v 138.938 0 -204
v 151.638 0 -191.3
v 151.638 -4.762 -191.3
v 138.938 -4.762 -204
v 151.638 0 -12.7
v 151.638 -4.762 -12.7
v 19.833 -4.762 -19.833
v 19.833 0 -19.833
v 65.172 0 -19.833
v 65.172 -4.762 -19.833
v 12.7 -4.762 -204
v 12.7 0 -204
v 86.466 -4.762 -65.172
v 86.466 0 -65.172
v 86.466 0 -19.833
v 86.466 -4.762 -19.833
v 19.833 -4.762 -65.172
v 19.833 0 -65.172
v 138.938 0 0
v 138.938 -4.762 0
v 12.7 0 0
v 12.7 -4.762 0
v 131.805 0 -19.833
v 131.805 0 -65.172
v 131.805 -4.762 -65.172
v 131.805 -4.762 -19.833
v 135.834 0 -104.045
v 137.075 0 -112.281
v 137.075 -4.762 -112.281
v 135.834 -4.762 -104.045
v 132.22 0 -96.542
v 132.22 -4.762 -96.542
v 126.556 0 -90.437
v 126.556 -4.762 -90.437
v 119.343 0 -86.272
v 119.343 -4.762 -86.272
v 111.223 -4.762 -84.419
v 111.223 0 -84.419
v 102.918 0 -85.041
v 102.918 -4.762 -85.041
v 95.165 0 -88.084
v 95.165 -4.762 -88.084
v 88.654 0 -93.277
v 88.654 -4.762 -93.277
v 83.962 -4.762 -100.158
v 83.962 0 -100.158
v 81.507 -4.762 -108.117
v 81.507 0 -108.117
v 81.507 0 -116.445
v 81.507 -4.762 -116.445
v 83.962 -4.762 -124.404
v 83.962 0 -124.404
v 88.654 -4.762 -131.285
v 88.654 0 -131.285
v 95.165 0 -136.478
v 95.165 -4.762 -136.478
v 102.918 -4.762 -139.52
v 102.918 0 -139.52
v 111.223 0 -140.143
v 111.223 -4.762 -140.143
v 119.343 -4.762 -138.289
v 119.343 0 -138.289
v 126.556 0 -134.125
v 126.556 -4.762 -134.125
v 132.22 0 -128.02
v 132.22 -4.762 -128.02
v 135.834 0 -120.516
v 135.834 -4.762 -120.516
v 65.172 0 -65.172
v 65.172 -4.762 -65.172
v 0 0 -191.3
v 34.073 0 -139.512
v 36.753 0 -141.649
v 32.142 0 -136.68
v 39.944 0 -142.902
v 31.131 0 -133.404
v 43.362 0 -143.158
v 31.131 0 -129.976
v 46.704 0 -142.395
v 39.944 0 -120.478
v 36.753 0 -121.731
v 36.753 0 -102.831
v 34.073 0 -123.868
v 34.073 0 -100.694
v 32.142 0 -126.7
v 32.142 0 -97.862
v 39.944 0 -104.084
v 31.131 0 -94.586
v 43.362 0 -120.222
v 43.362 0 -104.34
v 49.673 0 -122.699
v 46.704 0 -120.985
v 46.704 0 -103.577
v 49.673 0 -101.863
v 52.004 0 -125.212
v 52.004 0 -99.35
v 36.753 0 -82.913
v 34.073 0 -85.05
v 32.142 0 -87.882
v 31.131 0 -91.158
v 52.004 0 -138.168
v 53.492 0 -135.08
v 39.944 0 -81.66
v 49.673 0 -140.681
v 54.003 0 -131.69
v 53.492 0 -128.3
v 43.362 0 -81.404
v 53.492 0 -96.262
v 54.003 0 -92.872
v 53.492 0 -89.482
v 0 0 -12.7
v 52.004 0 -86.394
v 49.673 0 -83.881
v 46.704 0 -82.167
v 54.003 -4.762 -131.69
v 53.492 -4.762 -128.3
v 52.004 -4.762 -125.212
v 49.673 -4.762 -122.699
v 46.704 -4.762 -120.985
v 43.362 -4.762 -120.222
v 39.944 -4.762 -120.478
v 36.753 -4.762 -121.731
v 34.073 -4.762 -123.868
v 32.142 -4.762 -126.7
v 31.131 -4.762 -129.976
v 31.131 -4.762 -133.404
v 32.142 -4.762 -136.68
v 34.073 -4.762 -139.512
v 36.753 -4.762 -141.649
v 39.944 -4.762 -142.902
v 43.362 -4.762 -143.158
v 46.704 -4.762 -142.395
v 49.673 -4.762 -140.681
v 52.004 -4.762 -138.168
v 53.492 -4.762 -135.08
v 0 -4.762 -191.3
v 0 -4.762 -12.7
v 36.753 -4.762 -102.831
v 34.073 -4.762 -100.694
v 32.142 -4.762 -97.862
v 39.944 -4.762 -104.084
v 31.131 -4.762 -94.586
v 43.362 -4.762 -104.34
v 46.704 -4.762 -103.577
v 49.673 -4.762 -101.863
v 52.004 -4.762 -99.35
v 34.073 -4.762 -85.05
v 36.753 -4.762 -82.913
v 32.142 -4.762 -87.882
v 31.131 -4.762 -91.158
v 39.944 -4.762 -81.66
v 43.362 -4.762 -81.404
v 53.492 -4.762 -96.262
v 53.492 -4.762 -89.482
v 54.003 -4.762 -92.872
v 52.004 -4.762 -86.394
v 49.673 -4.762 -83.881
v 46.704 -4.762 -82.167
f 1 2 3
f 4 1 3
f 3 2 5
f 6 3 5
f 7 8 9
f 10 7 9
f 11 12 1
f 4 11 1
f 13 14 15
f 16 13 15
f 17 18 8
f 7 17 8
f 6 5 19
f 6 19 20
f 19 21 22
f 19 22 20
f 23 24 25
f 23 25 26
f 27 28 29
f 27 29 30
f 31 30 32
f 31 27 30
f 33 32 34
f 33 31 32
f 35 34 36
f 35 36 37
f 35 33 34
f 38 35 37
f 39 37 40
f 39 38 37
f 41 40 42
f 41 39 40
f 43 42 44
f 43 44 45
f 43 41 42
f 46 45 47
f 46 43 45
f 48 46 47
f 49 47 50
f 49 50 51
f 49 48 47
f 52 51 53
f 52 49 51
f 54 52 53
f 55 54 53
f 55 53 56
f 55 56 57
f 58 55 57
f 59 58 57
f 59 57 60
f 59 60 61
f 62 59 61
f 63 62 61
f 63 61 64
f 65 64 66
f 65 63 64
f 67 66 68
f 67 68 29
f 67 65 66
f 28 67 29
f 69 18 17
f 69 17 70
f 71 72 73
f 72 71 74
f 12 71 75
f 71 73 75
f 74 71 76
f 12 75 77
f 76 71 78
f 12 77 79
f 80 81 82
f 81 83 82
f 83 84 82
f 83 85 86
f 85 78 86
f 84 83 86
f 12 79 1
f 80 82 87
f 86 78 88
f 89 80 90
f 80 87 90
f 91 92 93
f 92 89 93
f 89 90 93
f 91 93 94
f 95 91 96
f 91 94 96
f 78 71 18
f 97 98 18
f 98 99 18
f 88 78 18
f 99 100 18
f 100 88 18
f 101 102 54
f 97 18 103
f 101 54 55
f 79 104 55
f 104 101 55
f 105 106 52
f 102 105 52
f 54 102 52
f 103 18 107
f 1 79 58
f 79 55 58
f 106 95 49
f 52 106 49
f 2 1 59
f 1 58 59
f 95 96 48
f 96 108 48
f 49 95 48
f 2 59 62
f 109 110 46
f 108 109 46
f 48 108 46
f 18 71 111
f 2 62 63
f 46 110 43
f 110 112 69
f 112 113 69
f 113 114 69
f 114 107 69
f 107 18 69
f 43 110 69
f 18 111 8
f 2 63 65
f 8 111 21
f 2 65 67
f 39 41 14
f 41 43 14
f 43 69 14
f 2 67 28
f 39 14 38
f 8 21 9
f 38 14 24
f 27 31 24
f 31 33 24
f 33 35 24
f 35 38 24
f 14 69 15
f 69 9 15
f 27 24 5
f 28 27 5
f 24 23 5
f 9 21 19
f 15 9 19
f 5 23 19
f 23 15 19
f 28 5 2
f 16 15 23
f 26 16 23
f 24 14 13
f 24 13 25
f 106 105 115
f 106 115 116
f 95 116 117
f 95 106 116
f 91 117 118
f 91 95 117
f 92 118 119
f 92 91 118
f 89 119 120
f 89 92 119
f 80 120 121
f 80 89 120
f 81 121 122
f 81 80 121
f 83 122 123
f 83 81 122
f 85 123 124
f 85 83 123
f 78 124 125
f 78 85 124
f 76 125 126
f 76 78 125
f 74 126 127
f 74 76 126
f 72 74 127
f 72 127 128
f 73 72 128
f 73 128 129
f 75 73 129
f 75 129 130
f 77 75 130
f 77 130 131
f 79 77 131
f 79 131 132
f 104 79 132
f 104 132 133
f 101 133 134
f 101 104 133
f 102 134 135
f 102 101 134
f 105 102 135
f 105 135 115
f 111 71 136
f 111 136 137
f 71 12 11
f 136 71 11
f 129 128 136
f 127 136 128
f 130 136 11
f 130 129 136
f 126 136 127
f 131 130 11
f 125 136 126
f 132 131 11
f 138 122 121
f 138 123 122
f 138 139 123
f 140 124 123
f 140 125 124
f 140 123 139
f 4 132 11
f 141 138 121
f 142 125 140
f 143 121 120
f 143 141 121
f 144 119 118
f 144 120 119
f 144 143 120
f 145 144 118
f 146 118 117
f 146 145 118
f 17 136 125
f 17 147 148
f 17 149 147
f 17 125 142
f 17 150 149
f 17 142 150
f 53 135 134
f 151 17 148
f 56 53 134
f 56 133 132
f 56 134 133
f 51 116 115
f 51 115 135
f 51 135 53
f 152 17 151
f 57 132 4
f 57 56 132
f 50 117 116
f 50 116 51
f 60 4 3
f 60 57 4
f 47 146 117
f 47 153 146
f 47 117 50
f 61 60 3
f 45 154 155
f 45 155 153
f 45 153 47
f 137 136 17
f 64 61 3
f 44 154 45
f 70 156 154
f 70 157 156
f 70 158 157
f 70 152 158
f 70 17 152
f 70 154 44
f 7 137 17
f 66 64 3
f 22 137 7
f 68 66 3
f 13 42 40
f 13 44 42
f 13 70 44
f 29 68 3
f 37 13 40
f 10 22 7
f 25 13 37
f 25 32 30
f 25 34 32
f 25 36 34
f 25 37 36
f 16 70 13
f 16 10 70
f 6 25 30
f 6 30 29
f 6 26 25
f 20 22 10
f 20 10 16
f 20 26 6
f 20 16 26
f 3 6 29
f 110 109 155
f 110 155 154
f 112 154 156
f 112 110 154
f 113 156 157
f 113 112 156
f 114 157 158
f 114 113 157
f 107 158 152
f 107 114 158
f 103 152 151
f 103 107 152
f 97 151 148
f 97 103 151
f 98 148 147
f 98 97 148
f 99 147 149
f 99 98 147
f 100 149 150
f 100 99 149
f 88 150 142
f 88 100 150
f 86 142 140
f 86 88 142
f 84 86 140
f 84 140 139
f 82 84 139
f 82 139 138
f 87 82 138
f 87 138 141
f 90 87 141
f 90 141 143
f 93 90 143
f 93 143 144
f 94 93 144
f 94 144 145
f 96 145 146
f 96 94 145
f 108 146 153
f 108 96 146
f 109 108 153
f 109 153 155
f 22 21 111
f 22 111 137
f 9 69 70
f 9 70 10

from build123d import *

# Parameters (mm, degrees)
F0_W     = 151.638
F0_H     = 204
F0_R     = 11.5
F0_R_2   = 27.94
F0_W_2   = 45.339
F0_H_2   = 45.339
F1_DEPTH = 4.7625
F2_SIZE  = 12.7


with BuildPart() as f1:
    # F0 (on Front) → F1 (new body)
    with BuildSketch(Plane.XZ):
        with Locations((75.819, -102)):
            Rectangle(F0_W, F0_H)
        with Locations((42.502667, -131.689877)):
            Circle(F0_R, mode=Mode.SUBTRACT)
        with Locations((109.135333, -112.280877)):
            Circle(F0_R_2, mode=Mode.SUBTRACT)
        with Locations((42.502667, -92.871877)):
            Circle(F0_R, mode=Mode.SUBTRACT)
        with Locations((42.502667, -42.502667)):
            Rectangle(F0_W_2, F0_H_2, mode=Mode.SUBTRACT)
        with Locations((109.135333, -42.502667)):
            Rectangle(F0_W_2, F0_H_2, mode=Mode.SUBTRACT)
    extrude(amount=F1_DEPTH)

    # F2
    f2_edges = [f1.edges().sort_by_distance(p)[0] for p in [
        (151.638, -2.38125, 0),
        (0, -2.38125, 0),
        (0, -2.38125, -204),
        (151.638, -2.38125, -204),
    ]]
    chamfer(f2_edges, length=F2_SIZE)


solid = f1.part
